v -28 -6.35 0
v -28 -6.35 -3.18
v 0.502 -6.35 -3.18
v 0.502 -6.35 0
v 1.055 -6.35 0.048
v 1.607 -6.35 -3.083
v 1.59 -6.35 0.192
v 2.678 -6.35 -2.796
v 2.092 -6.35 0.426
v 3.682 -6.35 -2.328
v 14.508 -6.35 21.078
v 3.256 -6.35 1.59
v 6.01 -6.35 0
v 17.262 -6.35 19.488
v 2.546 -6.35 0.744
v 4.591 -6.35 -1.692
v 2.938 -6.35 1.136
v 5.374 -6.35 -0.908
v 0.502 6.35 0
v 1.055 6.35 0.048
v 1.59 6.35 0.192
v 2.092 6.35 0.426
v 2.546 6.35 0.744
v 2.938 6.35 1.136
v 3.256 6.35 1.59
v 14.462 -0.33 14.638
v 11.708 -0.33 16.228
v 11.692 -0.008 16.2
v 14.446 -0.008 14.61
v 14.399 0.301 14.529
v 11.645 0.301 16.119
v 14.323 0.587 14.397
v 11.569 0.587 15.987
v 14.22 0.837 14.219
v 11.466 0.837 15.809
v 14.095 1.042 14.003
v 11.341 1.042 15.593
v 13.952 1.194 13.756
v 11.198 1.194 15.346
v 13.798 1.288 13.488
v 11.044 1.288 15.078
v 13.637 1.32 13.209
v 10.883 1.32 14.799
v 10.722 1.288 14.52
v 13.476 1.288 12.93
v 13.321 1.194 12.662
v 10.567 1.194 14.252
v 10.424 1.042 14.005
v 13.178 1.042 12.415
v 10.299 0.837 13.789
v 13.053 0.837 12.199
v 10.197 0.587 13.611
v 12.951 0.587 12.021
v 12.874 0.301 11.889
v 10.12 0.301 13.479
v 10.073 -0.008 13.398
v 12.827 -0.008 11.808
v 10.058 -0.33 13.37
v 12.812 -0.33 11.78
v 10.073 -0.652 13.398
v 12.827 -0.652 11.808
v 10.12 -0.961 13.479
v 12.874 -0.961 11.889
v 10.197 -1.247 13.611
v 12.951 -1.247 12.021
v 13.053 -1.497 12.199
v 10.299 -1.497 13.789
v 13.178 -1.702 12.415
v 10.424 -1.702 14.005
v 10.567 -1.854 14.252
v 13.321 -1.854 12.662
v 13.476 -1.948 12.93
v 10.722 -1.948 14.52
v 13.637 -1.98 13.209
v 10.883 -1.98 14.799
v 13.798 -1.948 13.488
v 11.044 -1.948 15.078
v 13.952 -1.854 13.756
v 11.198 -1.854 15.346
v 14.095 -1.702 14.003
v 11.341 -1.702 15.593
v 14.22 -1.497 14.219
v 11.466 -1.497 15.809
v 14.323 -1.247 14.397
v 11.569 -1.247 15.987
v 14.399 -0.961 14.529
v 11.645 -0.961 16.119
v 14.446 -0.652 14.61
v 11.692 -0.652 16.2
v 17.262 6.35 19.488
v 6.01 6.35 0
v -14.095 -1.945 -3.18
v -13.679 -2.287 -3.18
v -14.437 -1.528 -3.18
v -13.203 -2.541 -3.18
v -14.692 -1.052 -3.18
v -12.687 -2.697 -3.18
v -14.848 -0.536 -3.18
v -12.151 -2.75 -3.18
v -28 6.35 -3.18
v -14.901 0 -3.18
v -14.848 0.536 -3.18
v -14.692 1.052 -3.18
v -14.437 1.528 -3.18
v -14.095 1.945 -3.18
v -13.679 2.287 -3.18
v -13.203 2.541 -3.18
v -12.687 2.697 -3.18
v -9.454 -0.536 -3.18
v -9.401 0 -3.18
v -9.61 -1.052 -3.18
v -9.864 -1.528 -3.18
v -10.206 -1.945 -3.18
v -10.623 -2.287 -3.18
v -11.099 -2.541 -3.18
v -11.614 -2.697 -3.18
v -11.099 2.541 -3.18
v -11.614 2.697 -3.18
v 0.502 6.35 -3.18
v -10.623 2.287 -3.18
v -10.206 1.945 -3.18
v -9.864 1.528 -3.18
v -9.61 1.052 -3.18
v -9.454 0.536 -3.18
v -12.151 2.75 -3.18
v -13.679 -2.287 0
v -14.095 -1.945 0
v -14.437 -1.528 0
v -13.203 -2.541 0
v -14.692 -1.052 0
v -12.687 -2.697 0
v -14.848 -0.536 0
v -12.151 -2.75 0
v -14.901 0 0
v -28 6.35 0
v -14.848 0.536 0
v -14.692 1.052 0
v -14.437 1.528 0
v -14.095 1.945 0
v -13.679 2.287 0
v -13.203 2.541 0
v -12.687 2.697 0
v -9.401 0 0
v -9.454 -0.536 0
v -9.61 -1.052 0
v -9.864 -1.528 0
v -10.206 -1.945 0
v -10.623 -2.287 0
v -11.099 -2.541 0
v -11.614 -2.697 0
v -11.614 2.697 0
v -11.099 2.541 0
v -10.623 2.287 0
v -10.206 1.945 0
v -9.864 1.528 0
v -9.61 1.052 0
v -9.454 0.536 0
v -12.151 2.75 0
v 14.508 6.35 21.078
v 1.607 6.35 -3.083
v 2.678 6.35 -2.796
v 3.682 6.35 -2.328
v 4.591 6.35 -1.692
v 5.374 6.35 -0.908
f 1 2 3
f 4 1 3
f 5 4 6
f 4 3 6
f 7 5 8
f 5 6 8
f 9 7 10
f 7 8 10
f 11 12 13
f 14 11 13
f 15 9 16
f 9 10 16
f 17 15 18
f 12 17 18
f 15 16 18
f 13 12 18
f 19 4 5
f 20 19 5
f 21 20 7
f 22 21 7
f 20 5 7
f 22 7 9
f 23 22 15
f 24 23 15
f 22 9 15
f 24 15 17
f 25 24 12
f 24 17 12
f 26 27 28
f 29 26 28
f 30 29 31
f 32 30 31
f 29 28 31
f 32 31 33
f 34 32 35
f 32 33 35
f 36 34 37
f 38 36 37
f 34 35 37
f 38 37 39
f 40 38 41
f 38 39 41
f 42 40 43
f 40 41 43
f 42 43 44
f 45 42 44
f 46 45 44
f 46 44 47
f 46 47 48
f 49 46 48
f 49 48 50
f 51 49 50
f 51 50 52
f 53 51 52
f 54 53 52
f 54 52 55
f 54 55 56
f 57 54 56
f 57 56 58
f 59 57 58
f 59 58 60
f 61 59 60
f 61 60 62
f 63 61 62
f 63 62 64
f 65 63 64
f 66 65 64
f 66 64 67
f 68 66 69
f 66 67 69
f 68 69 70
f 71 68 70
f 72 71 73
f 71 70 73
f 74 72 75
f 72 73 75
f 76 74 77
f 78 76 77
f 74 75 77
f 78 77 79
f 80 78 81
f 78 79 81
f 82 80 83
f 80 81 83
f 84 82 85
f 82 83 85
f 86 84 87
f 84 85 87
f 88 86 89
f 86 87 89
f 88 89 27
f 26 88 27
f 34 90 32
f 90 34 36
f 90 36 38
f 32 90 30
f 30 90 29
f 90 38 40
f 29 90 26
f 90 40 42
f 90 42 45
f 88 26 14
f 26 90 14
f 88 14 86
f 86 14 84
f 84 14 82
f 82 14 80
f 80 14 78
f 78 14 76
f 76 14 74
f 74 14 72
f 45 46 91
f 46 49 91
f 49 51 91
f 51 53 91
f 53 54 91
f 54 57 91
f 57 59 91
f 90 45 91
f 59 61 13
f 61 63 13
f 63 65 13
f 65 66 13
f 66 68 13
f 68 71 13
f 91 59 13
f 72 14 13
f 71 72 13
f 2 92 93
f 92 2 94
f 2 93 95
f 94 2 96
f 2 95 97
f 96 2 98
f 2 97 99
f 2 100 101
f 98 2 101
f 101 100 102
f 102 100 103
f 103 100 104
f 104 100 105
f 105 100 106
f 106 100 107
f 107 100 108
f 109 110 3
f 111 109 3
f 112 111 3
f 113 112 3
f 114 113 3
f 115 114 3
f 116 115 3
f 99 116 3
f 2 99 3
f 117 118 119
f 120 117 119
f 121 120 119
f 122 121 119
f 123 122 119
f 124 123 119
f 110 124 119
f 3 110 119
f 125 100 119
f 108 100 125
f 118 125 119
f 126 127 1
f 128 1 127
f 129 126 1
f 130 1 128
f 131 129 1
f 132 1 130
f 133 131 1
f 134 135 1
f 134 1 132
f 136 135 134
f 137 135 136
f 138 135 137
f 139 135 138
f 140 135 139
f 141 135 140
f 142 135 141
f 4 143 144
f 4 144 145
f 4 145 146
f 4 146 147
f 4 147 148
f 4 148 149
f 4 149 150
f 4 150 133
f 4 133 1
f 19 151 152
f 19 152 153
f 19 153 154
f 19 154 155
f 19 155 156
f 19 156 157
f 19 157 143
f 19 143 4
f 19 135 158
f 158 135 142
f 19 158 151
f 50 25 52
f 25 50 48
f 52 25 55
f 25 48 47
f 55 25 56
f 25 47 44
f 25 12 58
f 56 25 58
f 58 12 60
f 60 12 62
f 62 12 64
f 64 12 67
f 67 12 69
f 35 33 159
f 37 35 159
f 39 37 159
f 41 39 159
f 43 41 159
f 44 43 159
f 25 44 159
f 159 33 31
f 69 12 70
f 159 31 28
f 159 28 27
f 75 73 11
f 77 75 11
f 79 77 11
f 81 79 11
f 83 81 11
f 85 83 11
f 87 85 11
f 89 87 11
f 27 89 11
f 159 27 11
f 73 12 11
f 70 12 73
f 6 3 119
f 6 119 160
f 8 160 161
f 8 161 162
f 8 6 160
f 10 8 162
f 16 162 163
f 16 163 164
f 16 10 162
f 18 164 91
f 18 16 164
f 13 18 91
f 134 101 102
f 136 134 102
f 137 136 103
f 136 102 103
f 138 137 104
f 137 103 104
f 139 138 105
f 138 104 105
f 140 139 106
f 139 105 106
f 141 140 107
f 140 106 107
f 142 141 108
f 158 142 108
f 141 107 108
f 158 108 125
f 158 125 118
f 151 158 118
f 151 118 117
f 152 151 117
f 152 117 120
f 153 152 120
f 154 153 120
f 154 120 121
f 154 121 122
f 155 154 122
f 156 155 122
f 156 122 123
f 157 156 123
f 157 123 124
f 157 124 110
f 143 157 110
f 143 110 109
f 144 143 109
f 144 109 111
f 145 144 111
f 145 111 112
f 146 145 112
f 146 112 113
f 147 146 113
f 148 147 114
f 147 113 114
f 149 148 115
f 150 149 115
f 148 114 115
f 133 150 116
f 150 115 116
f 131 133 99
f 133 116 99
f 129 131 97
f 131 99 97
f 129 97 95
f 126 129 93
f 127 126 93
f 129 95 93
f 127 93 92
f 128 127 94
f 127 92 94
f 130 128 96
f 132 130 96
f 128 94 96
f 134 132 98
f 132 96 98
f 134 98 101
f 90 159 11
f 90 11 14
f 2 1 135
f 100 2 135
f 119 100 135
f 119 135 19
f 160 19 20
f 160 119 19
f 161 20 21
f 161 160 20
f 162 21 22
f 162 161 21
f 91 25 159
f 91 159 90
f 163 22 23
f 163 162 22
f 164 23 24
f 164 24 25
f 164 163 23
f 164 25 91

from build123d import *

# Parameters (mm, degrees)
ESBO_O1_W               = 56
ESBO_O1_H               = 12.7
FLANGE_BASE1_DEPTH      = 3.18
DOBRA_START             = -6.35
DOBRA_ESBO_ADA1_DEPTH   = 12.7
DOBRA_ESBO_ADA1_2_DEPTH = 12.7
ESBO_O7_R               = 2.75
CORTE_EXTRUS_O2_DEPTH   = 10
ESBO_O11_R              = 1.65
CORTE_EXTRUS_O3_DEPTH   = 10


# Read off the part's stored shape, not the designer's step: Dobra esboçada1
# Sheet-metal steps are written as plain solids
with BuildPart() as part:
    # Esboço1 → Flange-base1 (new body)
    with BuildSketch(Plane.XY):
        Rectangle(ESBO_O1_W, ESBO_O1_H)
    extrude(amount=-FLANGE_BASE1_DEPTH)

    # Dobra esboçada1 outline → Dobra esboçada1 (cut)
    with BuildSketch(Plane(origin=(0, 0, 0), x_dir=(1, 0, 0), z_dir=(0, 1, 0)).offset(DOBRA_START)):
        with BuildLine():
            ThreePointArc((0.50243384, 3.18), (3.68243384, 2.327921568), (6.010355408, 0))
            Line((6.010355408, 0), (28, 0))
            Line((28, 0), (28, 3.18))
            Line((28, 3.18), (0.50243384, 3.18))
        make_face()
    extrude(amount=DOBRA_ESBO_ADA1_DEPTH, mode=Mode.SUBTRACT)

    # Dobra esbo_ada1 2 outline → Dobra esbo_ada1 2 (add)
    with BuildSketch(Plane(origin=(0, 0, 0), x_dir=(1, 0, 0), z_dir=(0, 1, 0)).offset(DOBRA_START)):
        with BuildLine():
            Line((3.256394624, -1.59), (14.507611545, -21.077679353))
            Line((14.507611545, -21.077679353), (17.261572329, -19.487679353))
            Line((17.261572329, -19.487679353), (6.010355408, 0))
            Line((6.010355408, 0), (0.50243384, 0))
            ThreePointArc((0.50243384, 0), (2.09243384, -0.426039216), (3.256394624, -1.59))
        make_face()
    extrude(amount=DOBRA_ESBO_ADA1_2_DEPTH)

    # Esboço7 → Corte-extrusão2 (cut)
    with BuildSketch(Plane(origin=(0, 0, -3.18), x_dir=(-1, 0, 0), z_dir=(0, 0, -1))):
        with Locations((12.150906248, 0)):
            Circle(ESBO_O7_R)
    extrude(amount=-CORTE_EXTRUS_O2_DEPTH, mode=Mode.SUBTRACT)

    # Esboço11 → Corte-extrusão3 (cut)
    with BuildSketch(Plane(origin=(1.753805772, 0, -1.012560235), x_dir=(0.49999999999999806, 0, 0.8660254037844398), z_dir=(-0.8660254037844397, 0, 0.499999999999998))):
        with Locations((18.257611545, -0.33)):
            Circle(ESBO_O11_R)
    extrude(amount=-CORTE_EXTRUS_O3_DEPTH, mode=Mode.SUBTRACT)


solid = part.part
